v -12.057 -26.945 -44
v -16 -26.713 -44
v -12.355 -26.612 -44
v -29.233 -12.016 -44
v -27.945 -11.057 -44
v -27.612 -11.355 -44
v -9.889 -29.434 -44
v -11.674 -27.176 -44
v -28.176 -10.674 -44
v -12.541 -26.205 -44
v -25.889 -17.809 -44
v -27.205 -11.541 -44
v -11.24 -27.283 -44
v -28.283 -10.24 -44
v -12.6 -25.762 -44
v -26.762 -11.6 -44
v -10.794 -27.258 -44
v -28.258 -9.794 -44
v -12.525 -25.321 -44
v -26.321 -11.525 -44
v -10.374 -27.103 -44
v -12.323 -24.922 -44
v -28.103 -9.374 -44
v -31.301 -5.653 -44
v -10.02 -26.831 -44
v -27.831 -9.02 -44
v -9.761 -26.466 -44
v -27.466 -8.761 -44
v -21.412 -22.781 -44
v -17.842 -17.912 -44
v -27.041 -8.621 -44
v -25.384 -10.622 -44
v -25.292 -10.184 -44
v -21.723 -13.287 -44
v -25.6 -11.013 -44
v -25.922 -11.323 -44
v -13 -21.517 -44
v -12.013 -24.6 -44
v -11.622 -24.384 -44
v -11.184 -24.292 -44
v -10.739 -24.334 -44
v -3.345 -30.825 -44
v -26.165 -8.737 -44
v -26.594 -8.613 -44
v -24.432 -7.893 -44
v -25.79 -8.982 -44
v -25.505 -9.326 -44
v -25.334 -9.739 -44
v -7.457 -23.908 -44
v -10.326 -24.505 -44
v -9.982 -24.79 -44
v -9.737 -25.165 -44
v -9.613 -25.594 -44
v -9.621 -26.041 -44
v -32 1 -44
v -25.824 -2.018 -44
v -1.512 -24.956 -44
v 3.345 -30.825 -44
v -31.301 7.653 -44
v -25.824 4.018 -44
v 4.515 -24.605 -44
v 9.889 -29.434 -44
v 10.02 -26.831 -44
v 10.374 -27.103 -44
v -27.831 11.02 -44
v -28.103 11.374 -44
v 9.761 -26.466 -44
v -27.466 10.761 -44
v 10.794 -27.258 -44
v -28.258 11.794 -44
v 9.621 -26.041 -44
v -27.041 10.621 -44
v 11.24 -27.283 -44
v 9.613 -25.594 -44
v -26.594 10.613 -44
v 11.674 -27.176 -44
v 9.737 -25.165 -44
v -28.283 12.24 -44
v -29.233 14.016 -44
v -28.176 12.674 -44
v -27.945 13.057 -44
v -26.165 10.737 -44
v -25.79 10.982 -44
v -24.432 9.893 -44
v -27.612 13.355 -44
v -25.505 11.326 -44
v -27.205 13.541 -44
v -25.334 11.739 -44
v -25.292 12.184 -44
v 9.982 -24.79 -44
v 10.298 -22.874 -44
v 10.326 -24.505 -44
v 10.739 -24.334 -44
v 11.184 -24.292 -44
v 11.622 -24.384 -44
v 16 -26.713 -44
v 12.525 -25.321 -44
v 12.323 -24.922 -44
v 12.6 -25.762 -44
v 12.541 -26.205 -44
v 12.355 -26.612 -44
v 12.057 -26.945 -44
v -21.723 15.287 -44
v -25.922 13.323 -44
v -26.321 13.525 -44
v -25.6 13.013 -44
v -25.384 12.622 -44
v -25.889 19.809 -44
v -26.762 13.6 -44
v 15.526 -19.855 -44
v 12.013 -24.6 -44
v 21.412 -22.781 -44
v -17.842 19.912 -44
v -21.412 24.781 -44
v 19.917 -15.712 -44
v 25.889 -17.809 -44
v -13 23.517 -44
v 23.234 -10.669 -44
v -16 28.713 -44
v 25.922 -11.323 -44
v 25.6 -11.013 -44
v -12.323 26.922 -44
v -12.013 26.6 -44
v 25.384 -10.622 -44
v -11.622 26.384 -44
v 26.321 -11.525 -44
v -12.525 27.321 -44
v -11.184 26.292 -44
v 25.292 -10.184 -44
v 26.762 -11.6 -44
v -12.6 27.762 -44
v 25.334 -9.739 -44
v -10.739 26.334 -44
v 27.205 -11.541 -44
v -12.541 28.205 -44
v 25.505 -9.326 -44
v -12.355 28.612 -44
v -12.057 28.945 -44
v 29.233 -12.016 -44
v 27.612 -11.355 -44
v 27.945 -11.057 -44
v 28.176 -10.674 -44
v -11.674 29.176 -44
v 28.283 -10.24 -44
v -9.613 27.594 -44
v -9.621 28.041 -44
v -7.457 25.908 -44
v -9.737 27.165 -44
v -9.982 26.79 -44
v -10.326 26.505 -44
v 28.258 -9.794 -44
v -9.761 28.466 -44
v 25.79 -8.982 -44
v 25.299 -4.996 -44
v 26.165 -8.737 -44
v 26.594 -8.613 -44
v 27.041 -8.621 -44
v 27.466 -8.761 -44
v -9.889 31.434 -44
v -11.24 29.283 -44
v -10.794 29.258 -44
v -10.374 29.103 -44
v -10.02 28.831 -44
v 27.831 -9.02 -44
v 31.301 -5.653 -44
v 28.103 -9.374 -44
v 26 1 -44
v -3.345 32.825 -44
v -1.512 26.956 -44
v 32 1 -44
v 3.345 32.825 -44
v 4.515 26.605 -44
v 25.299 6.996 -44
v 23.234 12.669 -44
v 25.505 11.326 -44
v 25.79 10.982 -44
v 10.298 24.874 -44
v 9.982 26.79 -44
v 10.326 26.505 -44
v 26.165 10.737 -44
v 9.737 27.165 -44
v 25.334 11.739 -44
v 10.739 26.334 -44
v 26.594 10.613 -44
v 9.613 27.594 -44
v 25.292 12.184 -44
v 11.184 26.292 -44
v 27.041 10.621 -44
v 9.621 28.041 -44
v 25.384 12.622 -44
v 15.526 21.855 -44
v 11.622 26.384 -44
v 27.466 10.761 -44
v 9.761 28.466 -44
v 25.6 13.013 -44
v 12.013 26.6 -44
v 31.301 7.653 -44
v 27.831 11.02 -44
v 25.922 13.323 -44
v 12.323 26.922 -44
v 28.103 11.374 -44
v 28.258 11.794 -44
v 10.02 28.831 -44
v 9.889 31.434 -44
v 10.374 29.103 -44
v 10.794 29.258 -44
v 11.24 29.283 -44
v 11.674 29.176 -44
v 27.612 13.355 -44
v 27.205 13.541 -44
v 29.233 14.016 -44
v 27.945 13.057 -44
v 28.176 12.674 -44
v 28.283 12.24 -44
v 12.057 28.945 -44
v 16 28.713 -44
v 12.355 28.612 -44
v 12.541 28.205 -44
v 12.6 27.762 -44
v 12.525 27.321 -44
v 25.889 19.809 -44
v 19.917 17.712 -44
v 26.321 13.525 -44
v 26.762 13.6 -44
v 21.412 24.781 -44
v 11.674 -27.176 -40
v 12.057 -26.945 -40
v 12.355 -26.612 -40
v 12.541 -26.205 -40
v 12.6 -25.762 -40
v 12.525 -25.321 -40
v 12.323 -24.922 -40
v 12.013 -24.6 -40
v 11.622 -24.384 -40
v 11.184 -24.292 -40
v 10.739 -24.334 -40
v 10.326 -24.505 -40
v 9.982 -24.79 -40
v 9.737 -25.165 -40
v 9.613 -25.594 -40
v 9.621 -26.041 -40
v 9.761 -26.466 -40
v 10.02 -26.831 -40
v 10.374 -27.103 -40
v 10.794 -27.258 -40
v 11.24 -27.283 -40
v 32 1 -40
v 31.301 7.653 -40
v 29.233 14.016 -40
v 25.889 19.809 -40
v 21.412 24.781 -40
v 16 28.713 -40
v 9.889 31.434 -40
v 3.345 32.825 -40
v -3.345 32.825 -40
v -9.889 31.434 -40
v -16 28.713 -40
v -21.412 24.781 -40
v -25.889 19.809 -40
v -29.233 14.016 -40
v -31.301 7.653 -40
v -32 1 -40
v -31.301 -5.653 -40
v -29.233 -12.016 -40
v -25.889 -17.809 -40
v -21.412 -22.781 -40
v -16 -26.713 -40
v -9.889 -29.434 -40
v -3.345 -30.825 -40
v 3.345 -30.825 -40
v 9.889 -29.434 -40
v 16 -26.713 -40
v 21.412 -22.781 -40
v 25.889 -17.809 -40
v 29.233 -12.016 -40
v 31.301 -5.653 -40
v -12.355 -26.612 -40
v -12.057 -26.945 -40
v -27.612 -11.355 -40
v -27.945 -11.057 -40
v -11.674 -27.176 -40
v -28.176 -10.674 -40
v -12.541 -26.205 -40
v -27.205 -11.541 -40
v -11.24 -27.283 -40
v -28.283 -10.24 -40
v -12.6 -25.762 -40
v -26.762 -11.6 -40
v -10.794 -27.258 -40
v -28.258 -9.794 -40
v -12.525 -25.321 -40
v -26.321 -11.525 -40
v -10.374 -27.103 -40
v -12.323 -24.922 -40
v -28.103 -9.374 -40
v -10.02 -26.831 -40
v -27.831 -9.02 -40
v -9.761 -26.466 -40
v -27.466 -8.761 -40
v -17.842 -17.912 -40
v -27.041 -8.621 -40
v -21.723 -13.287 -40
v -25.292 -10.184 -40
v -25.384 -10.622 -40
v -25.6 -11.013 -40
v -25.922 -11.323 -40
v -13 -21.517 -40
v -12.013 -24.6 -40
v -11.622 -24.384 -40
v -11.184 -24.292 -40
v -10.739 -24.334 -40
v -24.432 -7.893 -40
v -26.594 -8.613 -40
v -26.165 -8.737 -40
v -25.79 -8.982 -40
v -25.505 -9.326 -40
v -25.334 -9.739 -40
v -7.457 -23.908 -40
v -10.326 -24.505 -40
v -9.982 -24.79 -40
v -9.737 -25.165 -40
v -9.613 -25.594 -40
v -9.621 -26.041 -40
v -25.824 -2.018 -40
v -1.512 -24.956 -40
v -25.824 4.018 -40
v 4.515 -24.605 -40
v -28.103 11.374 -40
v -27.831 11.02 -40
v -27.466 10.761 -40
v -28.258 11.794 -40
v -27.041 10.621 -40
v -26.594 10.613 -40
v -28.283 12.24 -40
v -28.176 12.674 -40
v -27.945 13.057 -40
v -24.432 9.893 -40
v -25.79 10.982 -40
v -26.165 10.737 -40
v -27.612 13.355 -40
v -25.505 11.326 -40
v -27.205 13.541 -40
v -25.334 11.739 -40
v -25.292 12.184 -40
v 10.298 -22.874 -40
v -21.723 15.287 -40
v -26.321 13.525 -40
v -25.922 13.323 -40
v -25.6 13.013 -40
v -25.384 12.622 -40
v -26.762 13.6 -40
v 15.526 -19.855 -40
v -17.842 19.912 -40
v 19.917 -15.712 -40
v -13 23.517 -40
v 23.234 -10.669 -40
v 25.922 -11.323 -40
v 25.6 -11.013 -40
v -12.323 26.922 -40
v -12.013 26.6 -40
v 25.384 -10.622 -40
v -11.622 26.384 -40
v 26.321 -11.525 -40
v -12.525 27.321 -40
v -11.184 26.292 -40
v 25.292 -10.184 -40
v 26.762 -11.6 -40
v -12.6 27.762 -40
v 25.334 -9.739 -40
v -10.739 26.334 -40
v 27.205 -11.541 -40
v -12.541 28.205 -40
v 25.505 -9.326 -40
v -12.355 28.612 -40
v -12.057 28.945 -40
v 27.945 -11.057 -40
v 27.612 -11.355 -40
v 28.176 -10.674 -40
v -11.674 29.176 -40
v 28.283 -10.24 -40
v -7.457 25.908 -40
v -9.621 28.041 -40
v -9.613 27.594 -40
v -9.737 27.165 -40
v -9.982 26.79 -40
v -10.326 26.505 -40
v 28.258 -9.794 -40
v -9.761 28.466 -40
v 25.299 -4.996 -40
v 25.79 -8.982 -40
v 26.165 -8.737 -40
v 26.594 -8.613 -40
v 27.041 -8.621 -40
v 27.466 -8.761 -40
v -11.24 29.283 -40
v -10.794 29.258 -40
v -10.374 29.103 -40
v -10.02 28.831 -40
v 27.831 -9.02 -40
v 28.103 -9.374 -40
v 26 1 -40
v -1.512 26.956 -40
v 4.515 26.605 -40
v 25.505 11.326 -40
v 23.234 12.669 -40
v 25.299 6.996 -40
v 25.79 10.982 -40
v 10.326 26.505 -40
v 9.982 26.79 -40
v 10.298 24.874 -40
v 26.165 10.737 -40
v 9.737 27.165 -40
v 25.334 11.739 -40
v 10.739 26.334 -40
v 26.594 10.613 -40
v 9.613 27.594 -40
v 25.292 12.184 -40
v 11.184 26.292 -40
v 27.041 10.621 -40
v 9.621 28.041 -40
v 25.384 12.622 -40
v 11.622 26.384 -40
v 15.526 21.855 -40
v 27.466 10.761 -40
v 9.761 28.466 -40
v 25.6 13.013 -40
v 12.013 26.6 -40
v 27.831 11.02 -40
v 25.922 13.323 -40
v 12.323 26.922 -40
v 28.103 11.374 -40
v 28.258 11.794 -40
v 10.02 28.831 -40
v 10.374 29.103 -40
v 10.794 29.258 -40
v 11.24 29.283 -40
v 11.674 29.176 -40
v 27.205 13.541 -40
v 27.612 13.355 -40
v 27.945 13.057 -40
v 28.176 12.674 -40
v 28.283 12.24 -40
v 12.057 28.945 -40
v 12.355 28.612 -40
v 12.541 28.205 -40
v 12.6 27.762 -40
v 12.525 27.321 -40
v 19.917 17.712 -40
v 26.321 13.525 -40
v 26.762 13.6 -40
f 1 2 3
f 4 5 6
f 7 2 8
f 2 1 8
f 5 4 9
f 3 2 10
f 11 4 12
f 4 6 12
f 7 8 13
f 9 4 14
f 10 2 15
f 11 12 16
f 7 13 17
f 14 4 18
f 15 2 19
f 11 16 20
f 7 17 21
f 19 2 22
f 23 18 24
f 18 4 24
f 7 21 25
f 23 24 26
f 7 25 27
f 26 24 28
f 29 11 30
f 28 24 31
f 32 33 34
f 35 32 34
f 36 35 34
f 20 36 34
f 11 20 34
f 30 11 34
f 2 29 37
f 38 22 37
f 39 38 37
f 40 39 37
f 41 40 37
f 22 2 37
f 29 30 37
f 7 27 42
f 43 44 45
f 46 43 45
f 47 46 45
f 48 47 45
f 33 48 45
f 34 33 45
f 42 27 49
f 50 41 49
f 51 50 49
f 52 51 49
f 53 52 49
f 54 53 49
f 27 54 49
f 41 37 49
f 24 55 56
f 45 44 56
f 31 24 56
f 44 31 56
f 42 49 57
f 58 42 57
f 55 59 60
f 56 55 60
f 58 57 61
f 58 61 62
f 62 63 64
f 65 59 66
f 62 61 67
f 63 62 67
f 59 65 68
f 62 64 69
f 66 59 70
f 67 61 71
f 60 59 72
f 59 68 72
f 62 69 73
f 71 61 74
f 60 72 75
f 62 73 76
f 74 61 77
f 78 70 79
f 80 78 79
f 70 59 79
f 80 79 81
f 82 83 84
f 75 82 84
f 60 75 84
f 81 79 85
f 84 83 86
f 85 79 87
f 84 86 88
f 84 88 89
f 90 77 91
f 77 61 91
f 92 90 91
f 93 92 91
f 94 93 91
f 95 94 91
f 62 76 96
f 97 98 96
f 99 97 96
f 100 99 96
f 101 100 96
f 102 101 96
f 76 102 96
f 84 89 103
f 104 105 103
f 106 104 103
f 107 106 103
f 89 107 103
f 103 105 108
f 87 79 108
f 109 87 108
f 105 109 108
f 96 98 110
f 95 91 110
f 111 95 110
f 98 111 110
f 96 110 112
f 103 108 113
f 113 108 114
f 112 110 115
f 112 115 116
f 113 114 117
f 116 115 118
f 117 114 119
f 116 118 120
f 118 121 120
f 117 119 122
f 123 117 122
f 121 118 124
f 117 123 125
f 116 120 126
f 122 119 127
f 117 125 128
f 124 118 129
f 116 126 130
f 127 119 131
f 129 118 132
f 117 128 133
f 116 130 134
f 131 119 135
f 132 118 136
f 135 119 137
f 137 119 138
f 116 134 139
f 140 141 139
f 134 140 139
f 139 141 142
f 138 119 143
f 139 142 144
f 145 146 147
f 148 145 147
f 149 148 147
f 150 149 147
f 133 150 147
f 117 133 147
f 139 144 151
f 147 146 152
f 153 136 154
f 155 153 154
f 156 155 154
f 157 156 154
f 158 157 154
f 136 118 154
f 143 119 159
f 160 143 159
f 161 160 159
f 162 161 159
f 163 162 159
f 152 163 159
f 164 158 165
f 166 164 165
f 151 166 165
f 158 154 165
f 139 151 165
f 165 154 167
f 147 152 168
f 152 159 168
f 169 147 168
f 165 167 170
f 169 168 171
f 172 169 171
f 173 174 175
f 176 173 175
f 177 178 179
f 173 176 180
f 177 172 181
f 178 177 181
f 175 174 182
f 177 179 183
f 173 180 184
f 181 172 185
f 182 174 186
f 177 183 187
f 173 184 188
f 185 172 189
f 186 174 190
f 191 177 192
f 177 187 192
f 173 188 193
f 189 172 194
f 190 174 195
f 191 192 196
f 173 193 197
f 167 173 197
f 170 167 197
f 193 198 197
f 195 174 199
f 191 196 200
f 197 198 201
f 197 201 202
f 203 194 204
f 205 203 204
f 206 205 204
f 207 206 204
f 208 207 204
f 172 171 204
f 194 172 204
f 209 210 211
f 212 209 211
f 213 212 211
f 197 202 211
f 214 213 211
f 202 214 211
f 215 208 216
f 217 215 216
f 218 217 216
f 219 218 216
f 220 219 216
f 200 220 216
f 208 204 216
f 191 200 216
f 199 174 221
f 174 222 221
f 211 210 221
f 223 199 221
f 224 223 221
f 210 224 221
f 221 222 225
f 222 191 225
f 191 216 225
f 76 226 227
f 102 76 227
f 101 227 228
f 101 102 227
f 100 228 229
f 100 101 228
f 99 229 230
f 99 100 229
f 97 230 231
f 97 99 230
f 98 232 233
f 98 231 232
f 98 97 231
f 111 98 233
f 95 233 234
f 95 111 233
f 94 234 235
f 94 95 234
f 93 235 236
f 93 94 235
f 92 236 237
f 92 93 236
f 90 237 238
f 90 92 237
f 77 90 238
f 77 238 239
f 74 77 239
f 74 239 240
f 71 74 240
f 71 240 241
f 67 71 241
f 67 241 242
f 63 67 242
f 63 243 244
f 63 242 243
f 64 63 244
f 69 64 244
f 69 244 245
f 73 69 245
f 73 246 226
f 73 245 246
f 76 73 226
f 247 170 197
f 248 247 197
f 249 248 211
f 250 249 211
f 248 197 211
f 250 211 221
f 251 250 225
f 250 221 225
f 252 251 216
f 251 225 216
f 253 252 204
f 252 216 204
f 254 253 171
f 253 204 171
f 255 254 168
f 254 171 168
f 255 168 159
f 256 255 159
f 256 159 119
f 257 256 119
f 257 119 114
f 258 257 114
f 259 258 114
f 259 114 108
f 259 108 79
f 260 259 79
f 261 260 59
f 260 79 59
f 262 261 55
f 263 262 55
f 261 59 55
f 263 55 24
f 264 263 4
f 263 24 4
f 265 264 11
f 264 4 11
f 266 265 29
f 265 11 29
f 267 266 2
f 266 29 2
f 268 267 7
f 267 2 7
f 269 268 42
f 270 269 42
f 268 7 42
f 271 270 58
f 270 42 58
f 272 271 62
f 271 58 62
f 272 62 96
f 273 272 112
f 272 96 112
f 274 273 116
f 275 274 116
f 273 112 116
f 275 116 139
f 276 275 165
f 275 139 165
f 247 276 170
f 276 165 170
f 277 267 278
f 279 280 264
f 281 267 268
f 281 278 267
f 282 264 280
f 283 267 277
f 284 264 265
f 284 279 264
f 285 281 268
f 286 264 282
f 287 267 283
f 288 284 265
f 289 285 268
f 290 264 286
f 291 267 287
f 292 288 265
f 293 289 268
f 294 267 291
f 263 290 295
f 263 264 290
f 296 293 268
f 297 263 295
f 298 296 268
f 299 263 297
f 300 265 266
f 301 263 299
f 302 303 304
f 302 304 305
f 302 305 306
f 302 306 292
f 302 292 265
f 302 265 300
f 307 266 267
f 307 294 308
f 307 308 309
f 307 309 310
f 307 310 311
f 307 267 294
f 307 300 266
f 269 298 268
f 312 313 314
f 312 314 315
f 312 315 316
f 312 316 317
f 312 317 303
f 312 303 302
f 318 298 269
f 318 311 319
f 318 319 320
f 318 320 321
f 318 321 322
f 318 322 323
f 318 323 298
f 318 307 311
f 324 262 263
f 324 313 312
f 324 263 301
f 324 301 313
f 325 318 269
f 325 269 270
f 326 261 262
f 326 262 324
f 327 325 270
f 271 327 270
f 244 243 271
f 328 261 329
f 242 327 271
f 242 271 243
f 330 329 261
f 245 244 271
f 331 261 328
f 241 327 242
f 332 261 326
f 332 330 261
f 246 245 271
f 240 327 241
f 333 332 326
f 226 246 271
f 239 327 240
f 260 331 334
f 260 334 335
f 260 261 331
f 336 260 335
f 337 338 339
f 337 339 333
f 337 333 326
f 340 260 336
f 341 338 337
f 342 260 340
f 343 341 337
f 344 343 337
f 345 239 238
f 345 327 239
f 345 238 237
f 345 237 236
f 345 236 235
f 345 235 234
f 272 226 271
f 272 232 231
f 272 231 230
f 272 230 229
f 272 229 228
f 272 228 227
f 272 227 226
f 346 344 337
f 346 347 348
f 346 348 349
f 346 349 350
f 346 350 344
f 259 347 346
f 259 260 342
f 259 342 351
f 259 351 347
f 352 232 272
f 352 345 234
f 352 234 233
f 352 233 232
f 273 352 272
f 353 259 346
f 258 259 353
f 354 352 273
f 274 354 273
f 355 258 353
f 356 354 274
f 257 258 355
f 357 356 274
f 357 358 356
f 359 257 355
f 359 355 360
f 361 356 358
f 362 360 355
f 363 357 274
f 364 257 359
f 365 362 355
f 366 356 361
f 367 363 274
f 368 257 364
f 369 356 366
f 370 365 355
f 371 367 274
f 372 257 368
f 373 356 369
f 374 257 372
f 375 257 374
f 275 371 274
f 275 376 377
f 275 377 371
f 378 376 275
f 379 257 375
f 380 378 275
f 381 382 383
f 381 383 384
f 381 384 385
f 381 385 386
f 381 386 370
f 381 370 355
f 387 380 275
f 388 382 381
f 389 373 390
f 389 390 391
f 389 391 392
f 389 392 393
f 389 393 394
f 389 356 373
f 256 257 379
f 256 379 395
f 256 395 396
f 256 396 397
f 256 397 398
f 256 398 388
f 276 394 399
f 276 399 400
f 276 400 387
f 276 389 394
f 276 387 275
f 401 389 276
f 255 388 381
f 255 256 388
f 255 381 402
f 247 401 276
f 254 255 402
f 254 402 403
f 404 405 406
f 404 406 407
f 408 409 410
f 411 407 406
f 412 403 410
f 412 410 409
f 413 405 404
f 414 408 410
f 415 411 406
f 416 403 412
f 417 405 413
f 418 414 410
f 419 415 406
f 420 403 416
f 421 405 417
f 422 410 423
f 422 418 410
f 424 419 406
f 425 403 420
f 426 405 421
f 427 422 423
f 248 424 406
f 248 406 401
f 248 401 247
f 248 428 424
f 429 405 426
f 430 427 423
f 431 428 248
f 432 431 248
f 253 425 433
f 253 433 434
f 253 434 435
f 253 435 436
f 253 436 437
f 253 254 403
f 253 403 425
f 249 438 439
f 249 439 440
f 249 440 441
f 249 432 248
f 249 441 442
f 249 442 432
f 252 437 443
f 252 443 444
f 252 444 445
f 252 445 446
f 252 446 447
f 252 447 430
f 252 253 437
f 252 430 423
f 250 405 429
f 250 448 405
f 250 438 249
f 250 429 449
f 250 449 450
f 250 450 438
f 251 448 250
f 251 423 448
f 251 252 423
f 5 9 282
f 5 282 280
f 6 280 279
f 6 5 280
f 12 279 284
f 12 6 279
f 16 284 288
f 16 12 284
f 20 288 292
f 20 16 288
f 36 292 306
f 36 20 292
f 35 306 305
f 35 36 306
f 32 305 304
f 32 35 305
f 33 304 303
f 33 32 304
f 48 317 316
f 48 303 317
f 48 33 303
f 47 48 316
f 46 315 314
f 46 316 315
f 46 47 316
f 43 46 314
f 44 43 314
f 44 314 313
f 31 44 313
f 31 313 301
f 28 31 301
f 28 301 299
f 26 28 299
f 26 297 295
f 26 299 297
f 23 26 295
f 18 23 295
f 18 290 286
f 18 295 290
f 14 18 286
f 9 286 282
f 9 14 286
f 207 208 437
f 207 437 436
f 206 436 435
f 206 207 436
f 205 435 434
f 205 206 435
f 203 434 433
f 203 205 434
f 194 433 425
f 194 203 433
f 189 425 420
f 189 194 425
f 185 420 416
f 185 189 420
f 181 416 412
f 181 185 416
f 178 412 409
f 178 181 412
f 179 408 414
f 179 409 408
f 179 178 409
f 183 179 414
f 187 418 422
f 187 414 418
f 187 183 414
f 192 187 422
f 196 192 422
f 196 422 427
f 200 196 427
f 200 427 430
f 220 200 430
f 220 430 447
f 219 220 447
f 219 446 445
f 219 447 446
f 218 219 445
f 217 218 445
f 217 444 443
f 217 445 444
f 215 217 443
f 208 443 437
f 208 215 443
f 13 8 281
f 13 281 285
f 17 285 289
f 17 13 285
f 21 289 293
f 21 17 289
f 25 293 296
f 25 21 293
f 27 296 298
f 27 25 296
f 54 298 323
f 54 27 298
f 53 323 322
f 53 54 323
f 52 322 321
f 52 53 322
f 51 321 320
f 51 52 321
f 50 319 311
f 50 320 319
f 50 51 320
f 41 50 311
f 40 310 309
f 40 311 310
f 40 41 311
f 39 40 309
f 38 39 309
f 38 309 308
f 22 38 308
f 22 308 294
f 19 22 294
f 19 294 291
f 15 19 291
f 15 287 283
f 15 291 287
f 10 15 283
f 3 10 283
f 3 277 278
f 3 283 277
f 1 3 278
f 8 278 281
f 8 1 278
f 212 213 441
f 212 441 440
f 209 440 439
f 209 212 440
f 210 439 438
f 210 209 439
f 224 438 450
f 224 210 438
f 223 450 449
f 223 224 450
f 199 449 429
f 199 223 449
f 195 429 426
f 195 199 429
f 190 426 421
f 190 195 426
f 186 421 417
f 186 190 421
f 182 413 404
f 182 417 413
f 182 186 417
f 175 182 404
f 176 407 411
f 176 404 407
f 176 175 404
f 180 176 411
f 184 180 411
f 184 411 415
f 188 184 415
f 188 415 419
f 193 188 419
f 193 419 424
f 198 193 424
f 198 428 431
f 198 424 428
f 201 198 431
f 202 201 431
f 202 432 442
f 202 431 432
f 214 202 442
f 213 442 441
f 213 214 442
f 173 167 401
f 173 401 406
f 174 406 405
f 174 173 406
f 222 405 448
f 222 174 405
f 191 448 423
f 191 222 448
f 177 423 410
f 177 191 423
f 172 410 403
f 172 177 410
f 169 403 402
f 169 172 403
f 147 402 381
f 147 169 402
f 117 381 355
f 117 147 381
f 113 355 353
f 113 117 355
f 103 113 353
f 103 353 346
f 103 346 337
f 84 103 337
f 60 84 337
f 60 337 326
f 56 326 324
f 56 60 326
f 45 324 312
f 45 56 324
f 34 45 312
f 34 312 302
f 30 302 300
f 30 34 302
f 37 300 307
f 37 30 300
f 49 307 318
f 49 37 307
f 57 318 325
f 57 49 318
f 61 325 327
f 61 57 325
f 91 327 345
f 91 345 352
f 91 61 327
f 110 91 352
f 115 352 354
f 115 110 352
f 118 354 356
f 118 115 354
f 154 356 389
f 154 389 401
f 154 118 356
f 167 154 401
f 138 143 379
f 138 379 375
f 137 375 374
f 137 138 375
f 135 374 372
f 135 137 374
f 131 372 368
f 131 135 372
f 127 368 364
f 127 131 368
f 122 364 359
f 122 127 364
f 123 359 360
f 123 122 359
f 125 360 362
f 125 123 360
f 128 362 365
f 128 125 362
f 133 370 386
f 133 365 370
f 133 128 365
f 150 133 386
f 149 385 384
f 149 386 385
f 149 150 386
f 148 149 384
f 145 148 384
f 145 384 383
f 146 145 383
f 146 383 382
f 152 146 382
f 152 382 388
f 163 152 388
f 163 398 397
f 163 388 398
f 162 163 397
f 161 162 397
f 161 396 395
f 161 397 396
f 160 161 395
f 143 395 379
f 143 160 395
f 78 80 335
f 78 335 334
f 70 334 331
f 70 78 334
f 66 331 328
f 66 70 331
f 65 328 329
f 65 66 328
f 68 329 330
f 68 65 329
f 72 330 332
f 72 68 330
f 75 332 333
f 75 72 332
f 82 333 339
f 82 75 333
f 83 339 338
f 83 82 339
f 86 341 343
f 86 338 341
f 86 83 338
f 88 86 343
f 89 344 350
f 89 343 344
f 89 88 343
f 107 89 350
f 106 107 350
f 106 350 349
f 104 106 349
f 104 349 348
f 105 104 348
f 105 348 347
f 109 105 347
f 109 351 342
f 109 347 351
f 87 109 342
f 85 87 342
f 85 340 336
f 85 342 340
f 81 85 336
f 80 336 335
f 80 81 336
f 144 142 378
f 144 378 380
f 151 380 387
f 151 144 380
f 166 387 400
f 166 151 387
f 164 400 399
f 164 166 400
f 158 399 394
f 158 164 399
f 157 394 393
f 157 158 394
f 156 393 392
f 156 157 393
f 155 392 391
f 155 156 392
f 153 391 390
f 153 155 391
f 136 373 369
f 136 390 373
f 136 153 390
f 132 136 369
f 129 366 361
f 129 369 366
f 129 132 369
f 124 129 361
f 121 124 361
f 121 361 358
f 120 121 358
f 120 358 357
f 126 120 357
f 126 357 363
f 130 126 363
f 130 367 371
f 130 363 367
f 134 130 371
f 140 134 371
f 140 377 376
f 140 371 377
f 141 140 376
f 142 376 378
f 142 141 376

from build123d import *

# Parameters (mm, degrees)
CYLINDER1907_R               = 3
CYLINDER1907_DEPTH           = 3
CYLINDER1907_PLACEMENT_ANGLE = 67.5
CYLINDER1905_R               = 3
CYLINDER1905_DEPTH           = 3
CYLINDER1905_PLACEMENT_ANGLE = 112.5
CYLINDER1297_R               = 3
CYLINDER1297_DEPTH           = 3
CYLINDER1297_PLACEMENT_ANGLE = 157.5
CYLINDER1908_R               = 3
CYLINDER1908_DEPTH           = 3
CYLINDER1908_PLACEMENT_ANGLE = 202.5
CYLINDER1296_R               = 3
CYLINDER1296_DEPTH           = 3
CYLINDER1296_PLACEMENT_ANGLE = 112.5
CYLINDER1906_R               = 3
CYLINDER1906_DEPTH           = 3
CYLINDER1906_PLACEMENT_ANGLE = 67.5
CYLINDER1298_R               = 3
CYLINDER1298_DEPTH           = 3
CYLINDER1298_PLACEMENT_ANGLE = 22.5
CYLINDER1904_R               = 3
CYLINDER1904_DEPTH           = 3
CYLINDER1904_PLACEMENT_ANGLE = 22.5
CYLINDER1896_R               = 1.5
CYLINDER1896_DEPTH           = 20
CYLINDER1896_PLACEMENT_ANGLE = 67.5
CYLINDER1899_R               = 1.5
CYLINDER1899_DEPTH           = 20
CYLINDER1899_PLACEMENT_ANGLE = 112.5
CYLINDER1902_R               = 1.5
CYLINDER1902_DEPTH           = 20
CYLINDER1902_PLACEMENT_ANGLE = 157.5
CYLINDER1903_R               = 1.5
CYLINDER1903_DEPTH           = 20
CYLINDER1903_PLACEMENT_ANGLE = 202.5
CYLINDER1900_R               = 1.5
CYLINDER1900_DEPTH           = 20
CYLINDER1900_PLACEMENT_ANGLE = 112.5
CYLINDER1897_R               = 1.5
CYLINDER1897_DEPTH           = 20
CYLINDER1897_PLACEMENT_ANGLE = 67.5
CYLINDER1901_R               = 1.5
CYLINDER1901_DEPTH           = 20
CYLINDER1901_PLACEMENT_ANGLE = 22.5
CYLINDER1898_R               = 1.5
CYLINDER1898_DEPTH           = 20
CYLINDER1898_PLACEMENT_ANGLE = 22.5
TUBE012_R                    = 32
TUBE012_R_2                  = 26
TUBE012_DEPTH                = 4


with BuildPart() as v_lec1907:
    # Cylinder1907 → Cylinder1907 (new body)
    with BuildSketch(Plane.XY):
        Circle(CYLINDER1907_R)
    extrude(amount=CYLINDER1907_DEPTH)


with BuildPart() as v_lec1907_1:
    # Cylinder1907 placement: moved
    add(v_lec1907.part.moved(Location((11.1, 26.79, -50))).rotate(Axis((11.1, 26.79, -50), (0, 0, 1)), CYLINDER1907_PLACEMENT_ANGLE))


with BuildPart() as v_lec1905:
    # Cylinder1905 → Cylinder1905 (new body)
    with BuildSketch(Plane.XY):
        Circle(CYLINDER1905_R)
    extrude(amount=CYLINDER1905_DEPTH)


with BuildPart() as v_lec1905_1:
    # Cylinder1905 placement: moved
    add(v_lec1905.part.moved(Location((-11.1, 26.79, -50))).rotate(Axis((-11.1, 26.79, -50), (0, 0, 1)), CYLINDER1905_PLACEMENT_ANGLE))


with BuildPart() as v_lec1297:
    # Cylinder1297 → Cylinder1297 (new body)
    with BuildSketch(Plane.XY):
        Circle(CYLINDER1297_R)
    extrude(amount=CYLINDER1297_DEPTH)


with BuildPart() as v_lec1297_1:
    # Cylinder1297 placement: moved
    add(v_lec1297.part.moved(Location((-26.79, 11.1, -50))).rotate(Axis((-26.79, 11.1, -50), (0, 0, 1)), CYLINDER1297_PLACEMENT_ANGLE))


with BuildPart() as v_lec1908:
    # Cylinder1908 → Cylinder1908 (new body)
    with BuildSketch(Plane.XY):
        Circle(CYLINDER1908_R)
    extrude(amount=CYLINDER1908_DEPTH)


with BuildPart() as v_lec1908_1:
    # Cylinder1908 placement: moved
    add(v_lec1908.part.moved(Location((-26.79, -11.1, -50))).rotate(Axis((-26.79, -11.1, -50), (0, 0, 1)), CYLINDER1908_PLACEMENT_ANGLE))


with BuildPart() as v_lec1296:
    # Cylinder1296 → Cylinder1296 (new body)
    with BuildSketch(Plane.XY):
        Circle(CYLINDER1296_R)
    extrude(amount=CYLINDER1296_DEPTH)


with BuildPart() as v_lec1296_1:
    # Cylinder1296 placement: moved
    add(v_lec1296.part.moved(Location((-11.1, -26.79, -50))).rotate(Axis((-11.1, -26.79, -50), (0, 0, -1)), CYLINDER1296_PLACEMENT_ANGLE))


with BuildPart() as v_lec1906:
    # Cylinder1906 → Cylinder1906 (new body)
    with BuildSketch(Plane.XY):
        Circle(CYLINDER1906_R)
    extrude(amount=CYLINDER1906_DEPTH)


with BuildPart() as v_lec1906_1:
    # Cylinder1906 placement: moved
    add(v_lec1906.part.moved(Location((11.1, -26.79, -50))).rotate(Axis((11.1, -26.79, -50), (0, 0, -1)), CYLINDER1906_PLACEMENT_ANGLE))


with BuildPart() as v_lec1298:
    # Cylinder1298 → Cylinder1298 (new body)
    with BuildSketch(Plane.XY):
        Circle(CYLINDER1298_R)
    extrude(amount=CYLINDER1298_DEPTH)


with BuildPart() as v_lec1298_1:
    # Cylinder1298 placement: moved
    add(v_lec1298.part.moved(Location((26.79, -11.1, -50))).rotate(Axis((26.79, -11.1, -50), (0, 0, -1)), CYLINDER1298_PLACEMENT_ANGLE))


with BuildPart() as compound856:
    # Cylinder1904 → Cylinder1904 (new body)
    with BuildSketch(Plane.XY):
        Circle(CYLINDER1904_R)
    extrude(amount=CYLINDER1904_DEPTH)


with BuildPart() as compound856_1:
    # Cylinder1904 placement: moved
    add(compound856.part.moved(Location((26.79, 11.1, -50))).rotate(Axis((26.79, 11.1, -50), (0, 0, 1)), CYLINDER1904_PLACEMENT_ANGLE))

    # Compound856: union Válec1907, Válec1905, Válec1297, Válec1908, Válec1296, Válec1906, Válec1298
    add(v_lec1907_1.part)
    add(v_lec1905_1.part)
    add(v_lec1297_1.part)
    add(v_lec1908_1.part)
    add(v_lec1296_1.part)
    add(v_lec1906_1.part)
    add(v_lec1298_1.part)


with BuildPart() as v_lec1896:
    # Cylinder1896 → Cylinder1896 (new body)
    with BuildSketch(Plane.XY):
        Circle(CYLINDER1896_R)
    extrude(amount=CYLINDER1896_DEPTH)


with BuildPart() as v_lec1896_1:
    # Cylinder1896 placement: moved
    add(v_lec1896.part.moved(Location((11.1, 26.79, -50))).rotate(Axis((11.1, 26.79, -50), (0, 0, 1)), CYLINDER1896_PLACEMENT_ANGLE))


with BuildPart() as v_lec1899:
    # Cylinder1899 → Cylinder1899 (new body)
    with BuildSketch(Plane.XY):
        Circle(CYLINDER1899_R)
    extrude(amount=CYLINDER1899_DEPTH)


with BuildPart() as v_lec1899_1:
    # Cylinder1899 placement: moved
    add(v_lec1899.part.moved(Location((-11.1, 26.79, -50))).rotate(Axis((-11.1, 26.79, -50), (0, 0, 1)), CYLINDER1899_PLACEMENT_ANGLE))


with BuildPart() as v_lec1902:
    # Cylinder1902 → Cylinder1902 (new body)
    with BuildSketch(Plane.XY):
        Circle(CYLINDER1902_R)
    extrude(amount=CYLINDER1902_DEPTH)


with BuildPart() as v_lec1902_1:
    # Cylinder1902 placement: moved
    add(v_lec1902.part.moved(Location((-26.79, 11.1, -50))).rotate(Axis((-26.79, 11.1, -50), (0, 0, 1)), CYLINDER1902_PLACEMENT_ANGLE))


with BuildPart() as v_lec1903:
    # Cylinder1903 → Cylinder1903 (new body)
    with BuildSketch(Plane.XY):
        Circle(CYLINDER1903_R)
    extrude(amount=CYLINDER1903_DEPTH)


with BuildPart() as v_lec1903_1:
    # Cylinder1903 placement: moved
    add(v_lec1903.part.moved(Location((-26.79, -11.1, -50))).rotate(Axis((-26.79, -11.1, -50), (0, 0, 1)), CYLINDER1903_PLACEMENT_ANGLE))


with BuildPart() as v_lec1900:
    # Cylinder1900 → Cylinder1900 (new body)
    with BuildSketch(Plane.XY):
        Circle(CYLINDER1900_R)
    extrude(amount=CYLINDER1900_DEPTH)


with BuildPart() as v_lec1900_1:
    # Cylinder1900 placement: moved
    add(v_lec1900.part.moved(Location((-11.1, -26.79, -50))).rotate(Axis((-11.1, -26.79, -50), (0, 0, -1)), CYLINDER1900_PLACEMENT_ANGLE))


with BuildPart() as v_lec1897:
    # Cylinder1897 → Cylinder1897 (new body)
    with BuildSketch(Plane.XY):
        Circle(CYLINDER1897_R)
    extrude(amount=CYLINDER1897_DEPTH)


with BuildPart() as v_lec1897_1:
    # Cylinder1897 placement: moved
    add(v_lec1897.part.moved(Location((11.1, -26.79, -50))).rotate(Axis((11.1, -26.79, -50), (0, 0, -1)), CYLINDER1897_PLACEMENT_ANGLE))


with BuildPart() as v_lec1901:
    # Cylinder1901 → Cylinder1901 (new body)
    with BuildSketch(Plane.XY):
        Circle(CYLINDER1901_R)
    extrude(amount=CYLINDER1901_DEPTH)


with BuildPart() as v_lec1901_1:
    # Cylinder1901 placement: moved
    add(v_lec1901.part.moved(Location((26.79, -11.1, -50))).rotate(Axis((26.79, -11.1, -50), (0, 0, -1)), CYLINDER1901_PLACEMENT_ANGLE))


with BuildPart() as compound855:
    # Cylinder1898 → Cylinder1898 (new body)
    with BuildSketch(Plane.XY):
        Circle(CYLINDER1898_R)
    extrude(amount=CYLINDER1898_DEPTH)


with BuildPart() as compound855_1:
    # Cylinder1898 placement: moved
    add(compound855.part.moved(Location((26.79, 11.1, -50))).rotate(Axis((26.79, 11.1, -50), (0, 0, 1)), CYLINDER1898_PLACEMENT_ANGLE))

    # Compound855: union Válec1896, Válec1899, Válec1902, Válec1903, Válec1900, Válec1897, Válec1901
    add(v_lec1896_1.part)
    add(v_lec1899_1.part)
    add(v_lec1902_1.part)
    add(v_lec1903_1.part)
    add(v_lec1900_1.part)
    add(v_lec1897_1.part)
    add(v_lec1901_1.part)


with BuildPart() as t_mini_washer:
    # Tube012 → Tube012 (new body)
    with BuildSketch(Plane.XY.offset(-47)):
        Circle(TUBE012_R)
        Circle(TUBE012_R_2, mode=Mode.SUBTRACT)
    extrude(amount=TUBE012_DEPTH)

    # Cut692: cut Compound855
    add(compound855_1.part, mode=Mode.SUBTRACT)


with BuildPart() as t_mini_washer_1:
    # Cut692 placement: moved
    add(t_mini_washer.part.moved(Location((0, 0, 2))))

    # Cut693: cut Compound856
    add(compound856_1.part, mode=Mode.SUBTRACT)


with BuildPart() as t_mini_washer_2:
    # Cut693 placement: moved
    add(t_mini_washer_1.part.moved(Location((0, 1, 1))))


solid = t_mini_washer_2.part
